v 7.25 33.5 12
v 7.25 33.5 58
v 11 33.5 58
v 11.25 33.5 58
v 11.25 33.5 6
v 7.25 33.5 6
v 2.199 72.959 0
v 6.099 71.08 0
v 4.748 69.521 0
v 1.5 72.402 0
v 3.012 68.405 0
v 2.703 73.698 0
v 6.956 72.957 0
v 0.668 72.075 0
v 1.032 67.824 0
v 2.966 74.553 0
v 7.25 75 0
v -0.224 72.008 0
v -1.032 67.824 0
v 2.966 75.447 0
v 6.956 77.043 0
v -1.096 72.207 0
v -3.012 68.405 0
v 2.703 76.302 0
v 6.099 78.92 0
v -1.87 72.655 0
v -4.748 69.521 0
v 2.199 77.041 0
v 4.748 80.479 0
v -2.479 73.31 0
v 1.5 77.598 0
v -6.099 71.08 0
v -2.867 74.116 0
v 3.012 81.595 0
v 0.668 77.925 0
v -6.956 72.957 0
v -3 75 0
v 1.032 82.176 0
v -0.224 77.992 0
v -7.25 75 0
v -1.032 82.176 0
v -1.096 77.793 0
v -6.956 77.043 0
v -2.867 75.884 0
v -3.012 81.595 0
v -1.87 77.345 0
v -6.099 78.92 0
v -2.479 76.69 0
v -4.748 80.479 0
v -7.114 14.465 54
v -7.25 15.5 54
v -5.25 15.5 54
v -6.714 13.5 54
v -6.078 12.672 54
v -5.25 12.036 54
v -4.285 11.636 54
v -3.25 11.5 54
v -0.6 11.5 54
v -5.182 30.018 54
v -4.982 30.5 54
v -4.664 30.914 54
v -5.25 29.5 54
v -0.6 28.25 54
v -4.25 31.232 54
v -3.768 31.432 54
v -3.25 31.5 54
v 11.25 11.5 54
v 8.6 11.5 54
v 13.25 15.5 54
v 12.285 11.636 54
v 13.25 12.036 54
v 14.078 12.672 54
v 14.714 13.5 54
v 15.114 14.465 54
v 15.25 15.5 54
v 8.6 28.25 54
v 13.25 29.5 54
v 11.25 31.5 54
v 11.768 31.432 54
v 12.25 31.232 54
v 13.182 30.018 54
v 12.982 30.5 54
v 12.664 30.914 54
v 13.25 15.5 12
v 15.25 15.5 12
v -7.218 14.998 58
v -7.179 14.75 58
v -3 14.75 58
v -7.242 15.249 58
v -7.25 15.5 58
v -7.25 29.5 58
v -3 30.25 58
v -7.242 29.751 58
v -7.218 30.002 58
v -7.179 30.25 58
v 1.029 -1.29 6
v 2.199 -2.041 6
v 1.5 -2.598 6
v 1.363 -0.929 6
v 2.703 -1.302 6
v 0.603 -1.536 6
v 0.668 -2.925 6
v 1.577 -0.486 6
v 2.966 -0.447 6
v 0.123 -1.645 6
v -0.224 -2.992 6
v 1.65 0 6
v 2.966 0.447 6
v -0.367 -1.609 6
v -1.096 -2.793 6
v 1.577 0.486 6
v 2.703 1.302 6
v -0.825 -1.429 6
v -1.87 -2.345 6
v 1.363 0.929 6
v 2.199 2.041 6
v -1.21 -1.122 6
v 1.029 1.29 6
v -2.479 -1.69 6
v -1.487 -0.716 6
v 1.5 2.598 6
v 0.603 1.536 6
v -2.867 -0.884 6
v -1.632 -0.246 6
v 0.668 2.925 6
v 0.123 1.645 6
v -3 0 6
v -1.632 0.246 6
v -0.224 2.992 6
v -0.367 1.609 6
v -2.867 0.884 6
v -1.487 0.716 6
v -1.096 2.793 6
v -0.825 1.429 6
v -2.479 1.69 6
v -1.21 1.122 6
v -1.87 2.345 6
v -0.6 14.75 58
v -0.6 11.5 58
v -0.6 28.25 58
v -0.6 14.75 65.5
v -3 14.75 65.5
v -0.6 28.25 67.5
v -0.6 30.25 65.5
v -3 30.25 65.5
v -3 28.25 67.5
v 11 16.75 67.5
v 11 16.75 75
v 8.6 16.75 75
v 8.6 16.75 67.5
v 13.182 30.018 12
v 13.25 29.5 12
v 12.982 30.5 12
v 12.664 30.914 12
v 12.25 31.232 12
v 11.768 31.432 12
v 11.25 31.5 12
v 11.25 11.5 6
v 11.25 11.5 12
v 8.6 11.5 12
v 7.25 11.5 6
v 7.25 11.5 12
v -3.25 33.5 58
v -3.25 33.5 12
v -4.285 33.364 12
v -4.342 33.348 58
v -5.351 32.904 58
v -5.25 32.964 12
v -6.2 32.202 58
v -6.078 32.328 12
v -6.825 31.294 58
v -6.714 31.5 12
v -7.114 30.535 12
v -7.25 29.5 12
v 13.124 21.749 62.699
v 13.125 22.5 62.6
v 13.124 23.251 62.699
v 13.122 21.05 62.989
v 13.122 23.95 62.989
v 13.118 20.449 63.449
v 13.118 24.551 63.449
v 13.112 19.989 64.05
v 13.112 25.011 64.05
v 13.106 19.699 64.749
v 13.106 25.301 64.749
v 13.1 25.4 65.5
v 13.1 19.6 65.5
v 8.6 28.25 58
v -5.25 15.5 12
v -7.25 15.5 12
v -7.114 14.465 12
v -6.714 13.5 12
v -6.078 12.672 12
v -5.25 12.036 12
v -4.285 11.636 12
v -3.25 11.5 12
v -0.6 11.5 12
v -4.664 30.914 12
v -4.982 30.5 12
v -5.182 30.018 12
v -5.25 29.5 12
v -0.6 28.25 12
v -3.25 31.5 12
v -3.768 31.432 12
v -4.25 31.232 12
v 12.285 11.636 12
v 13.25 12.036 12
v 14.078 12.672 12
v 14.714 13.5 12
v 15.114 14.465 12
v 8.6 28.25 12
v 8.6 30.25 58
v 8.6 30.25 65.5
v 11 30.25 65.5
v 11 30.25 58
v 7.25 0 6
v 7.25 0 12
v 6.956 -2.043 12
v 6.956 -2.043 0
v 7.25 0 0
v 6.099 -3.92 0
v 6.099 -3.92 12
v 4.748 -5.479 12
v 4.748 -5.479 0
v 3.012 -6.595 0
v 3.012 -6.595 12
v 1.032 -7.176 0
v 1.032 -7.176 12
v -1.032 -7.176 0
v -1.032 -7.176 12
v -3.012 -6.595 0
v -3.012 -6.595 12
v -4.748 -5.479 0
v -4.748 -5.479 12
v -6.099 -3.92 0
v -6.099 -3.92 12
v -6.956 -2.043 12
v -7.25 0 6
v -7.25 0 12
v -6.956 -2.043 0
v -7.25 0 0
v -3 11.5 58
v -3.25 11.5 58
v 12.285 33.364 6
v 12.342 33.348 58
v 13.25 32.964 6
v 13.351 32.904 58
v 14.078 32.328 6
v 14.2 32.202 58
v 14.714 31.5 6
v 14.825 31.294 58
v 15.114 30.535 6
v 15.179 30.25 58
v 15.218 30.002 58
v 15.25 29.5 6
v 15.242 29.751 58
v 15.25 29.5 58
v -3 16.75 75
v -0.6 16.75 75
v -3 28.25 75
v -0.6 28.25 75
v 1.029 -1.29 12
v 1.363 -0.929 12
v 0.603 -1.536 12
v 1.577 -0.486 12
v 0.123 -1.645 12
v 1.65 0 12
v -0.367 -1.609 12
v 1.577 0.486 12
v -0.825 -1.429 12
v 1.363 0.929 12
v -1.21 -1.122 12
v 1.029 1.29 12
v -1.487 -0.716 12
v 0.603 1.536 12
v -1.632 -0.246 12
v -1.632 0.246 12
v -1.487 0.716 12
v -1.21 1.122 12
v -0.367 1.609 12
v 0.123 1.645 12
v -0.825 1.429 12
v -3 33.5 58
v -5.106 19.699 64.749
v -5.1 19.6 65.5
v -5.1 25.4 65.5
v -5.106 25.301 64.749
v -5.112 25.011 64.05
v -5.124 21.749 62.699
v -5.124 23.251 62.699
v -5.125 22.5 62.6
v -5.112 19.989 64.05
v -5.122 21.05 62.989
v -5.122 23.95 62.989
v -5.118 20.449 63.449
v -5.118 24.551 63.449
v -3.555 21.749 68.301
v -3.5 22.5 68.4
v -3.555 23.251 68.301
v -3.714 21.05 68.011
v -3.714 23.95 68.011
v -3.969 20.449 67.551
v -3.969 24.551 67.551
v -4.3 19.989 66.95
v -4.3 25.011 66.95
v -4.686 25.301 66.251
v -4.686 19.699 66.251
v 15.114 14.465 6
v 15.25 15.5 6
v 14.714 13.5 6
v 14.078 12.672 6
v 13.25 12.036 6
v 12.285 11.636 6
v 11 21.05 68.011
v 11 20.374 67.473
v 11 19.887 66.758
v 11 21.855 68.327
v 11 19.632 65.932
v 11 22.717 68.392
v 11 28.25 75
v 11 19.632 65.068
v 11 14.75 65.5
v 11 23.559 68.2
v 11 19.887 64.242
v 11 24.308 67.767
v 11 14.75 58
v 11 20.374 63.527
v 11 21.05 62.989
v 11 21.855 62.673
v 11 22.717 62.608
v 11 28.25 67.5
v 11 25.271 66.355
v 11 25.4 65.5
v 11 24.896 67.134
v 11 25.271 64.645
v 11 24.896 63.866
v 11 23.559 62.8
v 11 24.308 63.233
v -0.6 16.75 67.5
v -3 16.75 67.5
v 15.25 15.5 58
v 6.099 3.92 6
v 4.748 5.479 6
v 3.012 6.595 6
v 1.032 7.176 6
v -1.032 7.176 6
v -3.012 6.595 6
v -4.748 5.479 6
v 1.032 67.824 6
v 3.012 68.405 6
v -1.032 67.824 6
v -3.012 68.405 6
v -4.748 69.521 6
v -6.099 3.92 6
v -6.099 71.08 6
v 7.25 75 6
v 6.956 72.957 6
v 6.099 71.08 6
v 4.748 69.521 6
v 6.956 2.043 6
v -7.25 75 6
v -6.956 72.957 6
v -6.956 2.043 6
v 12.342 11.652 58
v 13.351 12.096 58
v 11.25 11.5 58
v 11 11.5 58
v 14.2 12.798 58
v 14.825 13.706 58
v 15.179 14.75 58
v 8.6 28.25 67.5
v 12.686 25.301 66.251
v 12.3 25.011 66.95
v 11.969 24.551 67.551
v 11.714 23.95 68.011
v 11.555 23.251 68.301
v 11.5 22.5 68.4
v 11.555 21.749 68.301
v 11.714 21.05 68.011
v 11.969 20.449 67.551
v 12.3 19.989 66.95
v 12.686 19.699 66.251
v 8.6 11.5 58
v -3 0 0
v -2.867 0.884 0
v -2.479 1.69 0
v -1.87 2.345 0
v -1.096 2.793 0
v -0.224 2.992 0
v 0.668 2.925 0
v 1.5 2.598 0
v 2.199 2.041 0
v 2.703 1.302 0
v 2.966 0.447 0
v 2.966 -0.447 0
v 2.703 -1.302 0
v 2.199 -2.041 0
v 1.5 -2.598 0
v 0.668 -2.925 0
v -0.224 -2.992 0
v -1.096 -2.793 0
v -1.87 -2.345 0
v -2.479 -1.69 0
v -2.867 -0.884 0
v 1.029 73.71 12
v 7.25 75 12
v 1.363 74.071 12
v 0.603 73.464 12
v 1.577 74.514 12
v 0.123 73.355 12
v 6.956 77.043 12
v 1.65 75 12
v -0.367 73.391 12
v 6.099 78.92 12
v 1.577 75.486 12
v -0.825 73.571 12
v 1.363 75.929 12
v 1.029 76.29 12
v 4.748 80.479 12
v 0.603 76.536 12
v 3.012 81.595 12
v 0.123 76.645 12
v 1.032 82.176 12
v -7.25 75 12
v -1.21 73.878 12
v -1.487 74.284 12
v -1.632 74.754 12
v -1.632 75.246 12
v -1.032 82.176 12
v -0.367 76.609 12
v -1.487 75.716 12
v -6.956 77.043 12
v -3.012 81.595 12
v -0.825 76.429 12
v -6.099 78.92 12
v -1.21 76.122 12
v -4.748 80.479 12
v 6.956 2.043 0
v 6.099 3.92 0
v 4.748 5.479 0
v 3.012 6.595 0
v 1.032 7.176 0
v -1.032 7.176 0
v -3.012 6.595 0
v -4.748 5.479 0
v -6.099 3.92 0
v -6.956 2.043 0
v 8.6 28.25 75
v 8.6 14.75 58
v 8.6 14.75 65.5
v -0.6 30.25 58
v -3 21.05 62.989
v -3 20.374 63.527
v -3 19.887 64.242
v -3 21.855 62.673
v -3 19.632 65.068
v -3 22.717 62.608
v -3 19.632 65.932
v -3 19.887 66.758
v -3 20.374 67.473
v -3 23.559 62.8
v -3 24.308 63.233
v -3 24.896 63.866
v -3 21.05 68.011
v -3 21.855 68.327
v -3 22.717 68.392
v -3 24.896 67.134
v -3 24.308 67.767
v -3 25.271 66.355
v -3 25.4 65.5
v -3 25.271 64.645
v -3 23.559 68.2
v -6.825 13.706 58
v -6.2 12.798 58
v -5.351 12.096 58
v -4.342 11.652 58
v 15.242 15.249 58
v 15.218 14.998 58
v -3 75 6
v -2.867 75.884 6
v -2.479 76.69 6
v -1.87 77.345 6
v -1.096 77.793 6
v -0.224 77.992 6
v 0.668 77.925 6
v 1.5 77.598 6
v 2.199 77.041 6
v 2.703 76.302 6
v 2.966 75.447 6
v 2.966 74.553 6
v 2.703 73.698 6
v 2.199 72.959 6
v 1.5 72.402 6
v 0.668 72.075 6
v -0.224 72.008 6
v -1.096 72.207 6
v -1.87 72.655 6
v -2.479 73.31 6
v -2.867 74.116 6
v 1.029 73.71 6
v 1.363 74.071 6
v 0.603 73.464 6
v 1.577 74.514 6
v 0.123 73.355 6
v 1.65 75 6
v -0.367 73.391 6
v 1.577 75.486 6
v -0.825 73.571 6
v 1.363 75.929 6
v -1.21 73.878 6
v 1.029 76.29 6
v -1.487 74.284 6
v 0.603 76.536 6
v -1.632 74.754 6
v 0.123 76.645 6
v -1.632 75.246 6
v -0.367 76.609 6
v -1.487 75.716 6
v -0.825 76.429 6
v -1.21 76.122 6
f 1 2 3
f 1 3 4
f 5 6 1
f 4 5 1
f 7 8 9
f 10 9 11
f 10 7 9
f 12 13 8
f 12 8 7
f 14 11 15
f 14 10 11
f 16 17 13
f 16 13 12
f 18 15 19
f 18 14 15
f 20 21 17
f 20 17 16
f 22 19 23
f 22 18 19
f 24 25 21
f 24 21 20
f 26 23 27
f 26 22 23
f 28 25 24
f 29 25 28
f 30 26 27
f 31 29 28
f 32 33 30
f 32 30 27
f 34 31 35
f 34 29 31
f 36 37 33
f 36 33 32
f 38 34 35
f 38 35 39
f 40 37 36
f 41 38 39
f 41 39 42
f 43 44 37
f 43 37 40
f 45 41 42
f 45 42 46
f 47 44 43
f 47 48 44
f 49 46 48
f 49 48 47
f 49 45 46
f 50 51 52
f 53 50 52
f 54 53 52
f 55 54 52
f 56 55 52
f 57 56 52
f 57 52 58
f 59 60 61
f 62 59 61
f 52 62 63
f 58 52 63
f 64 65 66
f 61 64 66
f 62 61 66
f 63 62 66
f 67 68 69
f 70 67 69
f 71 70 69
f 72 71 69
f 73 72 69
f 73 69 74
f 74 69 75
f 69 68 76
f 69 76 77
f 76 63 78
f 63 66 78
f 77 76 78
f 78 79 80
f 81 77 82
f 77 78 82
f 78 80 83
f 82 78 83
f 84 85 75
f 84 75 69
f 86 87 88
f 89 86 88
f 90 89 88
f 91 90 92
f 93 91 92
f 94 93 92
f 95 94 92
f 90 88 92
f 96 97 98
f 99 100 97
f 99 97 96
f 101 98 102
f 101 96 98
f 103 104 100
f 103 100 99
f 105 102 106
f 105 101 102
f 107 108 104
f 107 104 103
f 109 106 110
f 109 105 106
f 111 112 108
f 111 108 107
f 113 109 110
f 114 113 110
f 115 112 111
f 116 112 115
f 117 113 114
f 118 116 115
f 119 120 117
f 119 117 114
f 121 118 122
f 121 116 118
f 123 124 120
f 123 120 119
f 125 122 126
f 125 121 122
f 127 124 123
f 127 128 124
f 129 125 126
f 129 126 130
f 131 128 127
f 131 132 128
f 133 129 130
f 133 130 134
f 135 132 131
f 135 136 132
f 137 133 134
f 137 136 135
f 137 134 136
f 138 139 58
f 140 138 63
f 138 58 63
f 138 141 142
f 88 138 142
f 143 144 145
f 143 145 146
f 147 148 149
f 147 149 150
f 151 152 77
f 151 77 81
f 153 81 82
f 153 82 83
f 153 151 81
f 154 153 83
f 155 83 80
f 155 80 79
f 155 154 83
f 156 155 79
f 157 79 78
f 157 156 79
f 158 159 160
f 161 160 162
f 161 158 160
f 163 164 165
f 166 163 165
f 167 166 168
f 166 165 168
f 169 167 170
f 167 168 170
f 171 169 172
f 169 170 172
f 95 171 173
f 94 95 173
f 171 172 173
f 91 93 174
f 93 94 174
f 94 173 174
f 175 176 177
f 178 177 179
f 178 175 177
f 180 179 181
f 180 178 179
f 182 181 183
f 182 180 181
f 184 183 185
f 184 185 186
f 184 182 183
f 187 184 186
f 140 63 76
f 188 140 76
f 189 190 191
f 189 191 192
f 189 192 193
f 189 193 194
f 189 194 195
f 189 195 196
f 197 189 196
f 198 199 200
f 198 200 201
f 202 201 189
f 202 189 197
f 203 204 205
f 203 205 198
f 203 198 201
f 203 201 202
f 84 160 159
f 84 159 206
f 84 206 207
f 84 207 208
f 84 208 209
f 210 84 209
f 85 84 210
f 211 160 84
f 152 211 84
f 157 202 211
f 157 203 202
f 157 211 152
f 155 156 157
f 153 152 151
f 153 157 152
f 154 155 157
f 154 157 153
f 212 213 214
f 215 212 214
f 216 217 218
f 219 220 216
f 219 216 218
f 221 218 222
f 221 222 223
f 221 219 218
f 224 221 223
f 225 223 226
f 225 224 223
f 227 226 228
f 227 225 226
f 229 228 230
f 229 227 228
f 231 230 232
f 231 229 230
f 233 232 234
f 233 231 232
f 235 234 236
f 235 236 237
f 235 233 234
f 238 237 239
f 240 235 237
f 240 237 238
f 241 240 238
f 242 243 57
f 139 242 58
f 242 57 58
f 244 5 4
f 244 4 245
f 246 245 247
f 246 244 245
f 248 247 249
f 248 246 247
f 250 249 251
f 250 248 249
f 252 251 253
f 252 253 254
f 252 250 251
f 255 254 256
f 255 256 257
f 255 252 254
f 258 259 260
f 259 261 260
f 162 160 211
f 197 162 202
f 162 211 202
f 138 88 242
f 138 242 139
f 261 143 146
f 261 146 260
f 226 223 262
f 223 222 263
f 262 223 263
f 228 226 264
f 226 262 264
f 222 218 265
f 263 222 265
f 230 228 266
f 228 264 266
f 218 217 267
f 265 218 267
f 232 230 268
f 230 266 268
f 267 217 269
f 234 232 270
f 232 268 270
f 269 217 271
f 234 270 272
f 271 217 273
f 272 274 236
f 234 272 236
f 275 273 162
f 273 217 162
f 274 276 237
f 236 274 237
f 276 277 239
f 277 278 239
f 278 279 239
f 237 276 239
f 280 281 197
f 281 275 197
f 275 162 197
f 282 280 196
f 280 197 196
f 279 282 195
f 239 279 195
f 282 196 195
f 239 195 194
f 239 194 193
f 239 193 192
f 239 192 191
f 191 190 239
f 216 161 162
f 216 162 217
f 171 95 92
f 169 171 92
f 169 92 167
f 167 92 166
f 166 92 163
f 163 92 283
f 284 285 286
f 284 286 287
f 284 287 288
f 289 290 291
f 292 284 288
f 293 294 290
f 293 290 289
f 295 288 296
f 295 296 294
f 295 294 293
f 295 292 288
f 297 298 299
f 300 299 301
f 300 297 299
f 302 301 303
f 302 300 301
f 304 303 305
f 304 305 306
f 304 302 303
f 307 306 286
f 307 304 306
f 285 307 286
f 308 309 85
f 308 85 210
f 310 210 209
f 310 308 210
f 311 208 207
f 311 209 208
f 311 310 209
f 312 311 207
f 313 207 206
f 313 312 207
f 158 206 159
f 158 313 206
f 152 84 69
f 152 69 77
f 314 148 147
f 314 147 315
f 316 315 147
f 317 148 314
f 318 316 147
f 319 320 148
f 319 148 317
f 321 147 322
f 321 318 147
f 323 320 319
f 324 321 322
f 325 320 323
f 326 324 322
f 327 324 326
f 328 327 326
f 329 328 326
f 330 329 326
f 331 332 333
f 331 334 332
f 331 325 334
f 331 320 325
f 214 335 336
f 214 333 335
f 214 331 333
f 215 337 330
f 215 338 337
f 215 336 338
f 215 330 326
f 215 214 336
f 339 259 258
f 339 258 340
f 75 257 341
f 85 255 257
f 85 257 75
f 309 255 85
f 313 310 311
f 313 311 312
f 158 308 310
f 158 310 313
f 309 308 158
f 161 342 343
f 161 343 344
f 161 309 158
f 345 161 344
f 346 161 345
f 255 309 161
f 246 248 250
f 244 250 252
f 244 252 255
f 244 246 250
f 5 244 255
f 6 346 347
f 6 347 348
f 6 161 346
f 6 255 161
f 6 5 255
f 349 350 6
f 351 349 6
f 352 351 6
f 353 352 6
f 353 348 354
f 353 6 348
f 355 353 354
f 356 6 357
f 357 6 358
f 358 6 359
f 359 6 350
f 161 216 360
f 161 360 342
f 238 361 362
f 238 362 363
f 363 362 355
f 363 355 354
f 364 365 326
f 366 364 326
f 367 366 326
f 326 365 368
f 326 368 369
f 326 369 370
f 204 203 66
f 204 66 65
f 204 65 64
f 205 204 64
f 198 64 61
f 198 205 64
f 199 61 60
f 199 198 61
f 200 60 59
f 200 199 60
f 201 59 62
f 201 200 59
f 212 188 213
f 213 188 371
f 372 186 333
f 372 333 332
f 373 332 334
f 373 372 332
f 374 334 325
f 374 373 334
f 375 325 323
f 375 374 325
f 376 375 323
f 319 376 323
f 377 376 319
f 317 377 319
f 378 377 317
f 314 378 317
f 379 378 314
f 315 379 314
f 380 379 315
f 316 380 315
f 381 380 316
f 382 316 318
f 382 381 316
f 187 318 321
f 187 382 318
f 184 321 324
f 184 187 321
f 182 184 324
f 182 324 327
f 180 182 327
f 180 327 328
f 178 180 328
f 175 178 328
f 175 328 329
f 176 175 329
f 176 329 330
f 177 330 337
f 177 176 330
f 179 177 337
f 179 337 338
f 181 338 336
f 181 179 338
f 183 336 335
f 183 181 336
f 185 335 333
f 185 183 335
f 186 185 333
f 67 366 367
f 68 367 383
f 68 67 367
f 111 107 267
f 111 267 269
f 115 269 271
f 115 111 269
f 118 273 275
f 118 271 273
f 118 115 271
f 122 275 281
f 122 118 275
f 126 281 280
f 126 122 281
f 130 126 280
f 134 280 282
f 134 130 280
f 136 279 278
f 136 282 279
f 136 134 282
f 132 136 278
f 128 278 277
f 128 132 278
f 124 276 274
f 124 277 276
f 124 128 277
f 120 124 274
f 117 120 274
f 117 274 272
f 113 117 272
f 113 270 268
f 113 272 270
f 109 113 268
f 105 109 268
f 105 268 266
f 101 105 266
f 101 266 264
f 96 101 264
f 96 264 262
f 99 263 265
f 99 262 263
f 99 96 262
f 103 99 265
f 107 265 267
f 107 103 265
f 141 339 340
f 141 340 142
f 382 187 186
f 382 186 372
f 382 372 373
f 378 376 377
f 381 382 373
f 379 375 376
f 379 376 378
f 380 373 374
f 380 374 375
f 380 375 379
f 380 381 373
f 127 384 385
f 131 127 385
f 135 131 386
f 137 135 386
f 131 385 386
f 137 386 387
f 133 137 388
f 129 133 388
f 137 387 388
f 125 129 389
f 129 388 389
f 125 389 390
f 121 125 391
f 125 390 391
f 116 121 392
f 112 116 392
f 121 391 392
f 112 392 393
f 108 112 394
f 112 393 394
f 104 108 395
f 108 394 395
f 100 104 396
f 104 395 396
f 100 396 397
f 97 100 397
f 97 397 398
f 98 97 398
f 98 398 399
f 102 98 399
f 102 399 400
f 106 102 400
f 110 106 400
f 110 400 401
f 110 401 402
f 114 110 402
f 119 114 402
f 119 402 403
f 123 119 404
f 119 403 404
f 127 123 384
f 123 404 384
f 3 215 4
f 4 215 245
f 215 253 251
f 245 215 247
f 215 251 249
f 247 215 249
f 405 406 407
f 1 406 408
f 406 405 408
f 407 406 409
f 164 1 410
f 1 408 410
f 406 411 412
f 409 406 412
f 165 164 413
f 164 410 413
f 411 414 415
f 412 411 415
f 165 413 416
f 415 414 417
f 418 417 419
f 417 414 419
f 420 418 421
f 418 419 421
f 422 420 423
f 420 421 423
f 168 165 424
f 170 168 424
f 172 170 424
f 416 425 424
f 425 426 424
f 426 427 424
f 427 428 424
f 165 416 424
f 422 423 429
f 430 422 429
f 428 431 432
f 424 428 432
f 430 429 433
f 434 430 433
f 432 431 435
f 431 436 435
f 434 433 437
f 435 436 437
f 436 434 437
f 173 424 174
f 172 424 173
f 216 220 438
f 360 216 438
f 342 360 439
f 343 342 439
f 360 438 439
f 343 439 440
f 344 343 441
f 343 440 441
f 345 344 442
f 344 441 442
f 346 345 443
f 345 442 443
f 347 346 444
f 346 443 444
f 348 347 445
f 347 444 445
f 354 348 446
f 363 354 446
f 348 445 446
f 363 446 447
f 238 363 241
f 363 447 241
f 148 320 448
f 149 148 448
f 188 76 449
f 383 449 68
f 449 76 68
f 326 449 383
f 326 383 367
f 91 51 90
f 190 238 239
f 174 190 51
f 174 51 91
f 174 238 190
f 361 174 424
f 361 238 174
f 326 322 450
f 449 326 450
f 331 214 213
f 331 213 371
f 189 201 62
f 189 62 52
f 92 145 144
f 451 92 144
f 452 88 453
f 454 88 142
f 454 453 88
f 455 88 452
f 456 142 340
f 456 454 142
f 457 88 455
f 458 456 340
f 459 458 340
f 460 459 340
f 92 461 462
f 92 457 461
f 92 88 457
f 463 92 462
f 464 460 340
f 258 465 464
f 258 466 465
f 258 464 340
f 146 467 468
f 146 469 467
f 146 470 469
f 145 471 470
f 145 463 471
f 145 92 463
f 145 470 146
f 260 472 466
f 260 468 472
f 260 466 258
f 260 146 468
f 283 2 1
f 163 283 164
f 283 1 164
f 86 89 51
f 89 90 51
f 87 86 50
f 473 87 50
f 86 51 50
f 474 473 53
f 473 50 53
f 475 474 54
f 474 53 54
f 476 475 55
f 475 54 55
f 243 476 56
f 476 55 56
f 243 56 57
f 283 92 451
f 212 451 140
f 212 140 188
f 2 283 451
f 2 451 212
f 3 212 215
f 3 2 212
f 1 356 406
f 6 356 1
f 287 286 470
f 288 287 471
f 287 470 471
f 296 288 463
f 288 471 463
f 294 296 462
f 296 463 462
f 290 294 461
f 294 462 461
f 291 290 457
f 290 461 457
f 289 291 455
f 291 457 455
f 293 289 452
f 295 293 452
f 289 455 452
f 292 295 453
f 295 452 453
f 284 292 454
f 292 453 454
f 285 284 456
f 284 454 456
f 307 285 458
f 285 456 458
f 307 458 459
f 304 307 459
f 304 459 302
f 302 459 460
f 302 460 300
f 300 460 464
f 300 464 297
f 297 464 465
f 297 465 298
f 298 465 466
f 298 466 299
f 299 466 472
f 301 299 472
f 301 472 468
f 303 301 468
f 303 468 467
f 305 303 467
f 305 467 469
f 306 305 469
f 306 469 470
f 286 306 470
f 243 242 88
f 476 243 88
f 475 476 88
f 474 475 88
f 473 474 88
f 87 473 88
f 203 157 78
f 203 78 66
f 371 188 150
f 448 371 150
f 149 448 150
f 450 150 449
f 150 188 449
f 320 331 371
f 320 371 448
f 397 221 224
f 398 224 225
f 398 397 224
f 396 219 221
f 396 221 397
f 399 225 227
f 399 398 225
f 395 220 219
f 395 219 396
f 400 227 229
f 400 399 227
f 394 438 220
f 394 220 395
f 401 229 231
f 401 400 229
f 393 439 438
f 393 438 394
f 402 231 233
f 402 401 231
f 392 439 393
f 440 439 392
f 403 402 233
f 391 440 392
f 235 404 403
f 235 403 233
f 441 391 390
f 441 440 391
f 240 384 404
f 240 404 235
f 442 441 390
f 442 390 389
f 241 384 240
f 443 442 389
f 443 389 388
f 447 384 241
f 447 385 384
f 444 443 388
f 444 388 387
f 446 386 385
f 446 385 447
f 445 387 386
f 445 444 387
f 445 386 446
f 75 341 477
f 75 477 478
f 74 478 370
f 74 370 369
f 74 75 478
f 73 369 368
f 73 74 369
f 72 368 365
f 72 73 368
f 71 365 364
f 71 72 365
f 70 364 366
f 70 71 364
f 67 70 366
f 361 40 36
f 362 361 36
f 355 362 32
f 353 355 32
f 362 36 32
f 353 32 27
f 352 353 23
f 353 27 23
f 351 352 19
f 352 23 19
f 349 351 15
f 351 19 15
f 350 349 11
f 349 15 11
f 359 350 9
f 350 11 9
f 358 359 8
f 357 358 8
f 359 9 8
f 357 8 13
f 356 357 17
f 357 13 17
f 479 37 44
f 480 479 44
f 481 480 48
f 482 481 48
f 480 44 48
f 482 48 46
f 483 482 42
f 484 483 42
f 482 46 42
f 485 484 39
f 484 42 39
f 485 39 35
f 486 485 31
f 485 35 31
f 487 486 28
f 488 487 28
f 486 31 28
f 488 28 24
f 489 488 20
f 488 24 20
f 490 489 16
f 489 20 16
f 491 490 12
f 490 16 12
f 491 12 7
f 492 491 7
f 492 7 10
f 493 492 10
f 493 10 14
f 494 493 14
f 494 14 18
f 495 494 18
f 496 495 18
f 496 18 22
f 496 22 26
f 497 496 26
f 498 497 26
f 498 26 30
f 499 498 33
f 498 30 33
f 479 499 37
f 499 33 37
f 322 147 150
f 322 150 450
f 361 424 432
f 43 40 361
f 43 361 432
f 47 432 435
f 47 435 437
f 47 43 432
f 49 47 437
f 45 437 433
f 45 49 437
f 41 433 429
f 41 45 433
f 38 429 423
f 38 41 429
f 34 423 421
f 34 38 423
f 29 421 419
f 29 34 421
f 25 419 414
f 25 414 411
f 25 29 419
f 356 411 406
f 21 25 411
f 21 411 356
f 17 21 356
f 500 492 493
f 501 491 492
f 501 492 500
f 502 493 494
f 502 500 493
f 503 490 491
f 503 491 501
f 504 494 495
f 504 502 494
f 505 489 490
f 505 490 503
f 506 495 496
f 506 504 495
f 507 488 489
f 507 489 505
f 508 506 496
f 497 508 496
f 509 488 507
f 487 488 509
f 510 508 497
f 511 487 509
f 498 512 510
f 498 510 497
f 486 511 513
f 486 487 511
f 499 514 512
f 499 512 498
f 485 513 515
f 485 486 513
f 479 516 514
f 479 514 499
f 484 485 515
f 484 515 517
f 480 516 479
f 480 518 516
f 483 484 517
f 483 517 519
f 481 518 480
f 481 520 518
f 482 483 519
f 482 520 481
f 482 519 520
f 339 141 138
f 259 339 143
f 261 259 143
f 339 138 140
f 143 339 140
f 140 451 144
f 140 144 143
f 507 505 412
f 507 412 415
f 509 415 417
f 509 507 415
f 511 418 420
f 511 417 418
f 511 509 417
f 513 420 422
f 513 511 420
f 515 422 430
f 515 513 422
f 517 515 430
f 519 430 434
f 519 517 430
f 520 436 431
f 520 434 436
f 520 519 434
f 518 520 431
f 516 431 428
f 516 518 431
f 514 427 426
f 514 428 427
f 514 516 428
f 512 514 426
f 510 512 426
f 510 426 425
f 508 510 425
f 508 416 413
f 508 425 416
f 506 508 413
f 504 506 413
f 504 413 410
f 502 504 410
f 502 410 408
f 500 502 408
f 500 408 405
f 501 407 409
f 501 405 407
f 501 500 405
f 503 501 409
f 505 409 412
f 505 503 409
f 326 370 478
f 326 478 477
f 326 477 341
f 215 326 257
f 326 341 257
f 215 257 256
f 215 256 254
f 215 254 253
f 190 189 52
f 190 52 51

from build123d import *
from build123d.topology import SkipClean

# Parameters (mm, degrees)
SKETCH1_R           = 1.65
BOSS_EXTRUDE1_DEPTH = 75
SKETCH7_R           = 3
CUT_EXTRUDE6_DEPTH  = 6
CUT_EXTRUDE12_START = -63
CUT_EXTRUDE12_DEPTH = 63
SKETCH9_W           = 17
SKETCH9_H           = 22
SKETCH9_R           = 2.9
CUT_EXTRUDE8_DEPTH  = 4.25
CUT_EXTRUDE9_START  = -4.25
SKETCH10_W          = 17
SKETCH10_H          = 22
SKETCH10_R          = 2.9
CUT_EXTRUDE9_DEPTH  = 4.25
CUT_EXTRUDE10_DEPTH = 17
CUT_EXTRUDE11_START = -18.25
CUT_EXTRUDE11_DEPTH = 14
CUT_EXTRUDE13_START = -13.9000001
CUT_EXTRUDE13_DEPTH = 6.9000001
CUT_EXTRUDE14_DEPTH = 42


with BuildPart() as part:
    # Sketch1 → Boss-Extrude1 (new body)
    with BuildSketch(Plane.XY):
        with BuildLine():
            Line((15.25, 29.5), (15.25, 15.5))
            ThreePointArc((15.25, 15.5), (14.078427125, 12.671572875), (11.25, 11.5))
            Line((11.25, 11.5), (7.25, 11.5))
            Line((7.25, 11.5), (7.25, 0))
            ThreePointArc((7.25, 0), (0, -7.25), (-7.25, 0))
            Line((-7.25, 0), (-7.25, 75))
            ThreePointArc((-7.25, 75), (0, 82.25), (7.25, 75))
            Line((7.25, 75), (7.25, 33.5))
            Line((7.25, 33.5), (11.25, 33.5))
            ThreePointArc((11.25, 33.5), (14.078427125, 32.328427125), (15.25, 29.5))
        make_face()
        Circle(SKETCH1_R, mode=Mode.SUBTRACT)
        with Locations((0, 75)):
            Circle(SKETCH1_R, mode=Mode.SUBTRACT)
    extrude(amount=BOSS_EXTRUDE1_DEPTH)

    # Sketch7 → Cut-Extrude6 (cut)
    with SkipClean():  # the faces are left unmerged after this step: merging them gives an invalid solid
        with BuildSketch(Plane(origin=(0, 0, 0), x_dir=(-1, 0, 0), z_dir=(0, 0, -1))):
            with Locations((0, 75)):
                Circle(SKETCH7_R)
            Circle(SKETCH7_R)
            with BuildLine():
                Line((-7.25, 75), (-7.25, 33.5))
                Line((-7.25, 33.5), (-11.25, 33.5))
                ThreePointArc((-11.25, 33.5), (-14.078427125, 32.328427125), (-15.25, 29.5))
                Line((-15.25, 29.5), (-15.25, 15.5))
                ThreePointArc((-15.25, 15.5), (-14.078427125, 12.671572875), (-11.25, 11.5))
                Line((-11.25, 11.5), (-7.25, 11.5))
                Line((-7.25, 11.5), (-7.25, 0))
                ThreePointArc((-7.25, 0), (0, 7.25), (7.25, 0))
                Line((7.25, 0), (7.25, 75))
                ThreePointArc((7.25, 75), (0, 67.75), (-7.25, 75))
            make_face()
        extrude(amount=-CUT_EXTRUDE6_DEPTH, mode=Mode.SUBTRACT)

    # Sketch14 → Cut-Extrude12 (cut)
    with SkipClean():  # the faces are left unmerged after this step: merging them gives an invalid solid
        with BuildSketch(Plane.XY.offset(75).offset(CUT_EXTRUDE12_START)):
            with BuildLine():
                Line((-0.6, 28.25), (8.6, 28.25))
                Line((8.6, 28.25), (8.6, 11.5))
                Line((8.6, 11.5), (7.25, 11.5))
                Line((7.25, 11.5), (7.25, 0))
                ThreePointArc((7.25, 0), (0, -7.25), (-7.25, 0))
                Line((-7.25, 0), (-7.25, 15.5))
                ThreePointArc((-7.25, 15.5), (-6.078427125, 12.671572875), (-3.25, 11.5))
                Line((-3.25, 11.5), (-0.6, 11.5))
                Line((-0.6, 11.5), (-0.6, 28.25))
            make_face()
            with BuildLine():
                Line((7.25, 33.5), (-3.25, 33.5))
                ThreePointArc((-3.25, 33.5), (-6.078427125, 32.328427125), (-7.25, 29.5))
                Line((-7.25, 29.5), (-7.25, 75))
                ThreePointArc((-7.25, 75), (0, 82.25), (7.25, 75))
                Line((7.25, 75), (7.25, 33.5))
            make_face()
        extrude(amount=CUT_EXTRUDE12_DEPTH, mode=Mode.SUBTRACT)

    # Sketch9 → Cut-Extrude8 (cut)
    with SkipClean():  # the faces are left unmerged after this step: merging them gives an invalid solid
        with BuildSketch(Plane(origin=(15.25, 0, 0), x_dir=(0, 0, -1), z_dir=(1, 0, 0))):
            with Locations((-66.5, 22.5)):
                Rectangle(SKETCH9_W, SKETCH9_H)
            with Locations(Location((-65.5, 22.5, 0), (0, 0, 90))):
                Circle(SKETCH9_R, mode=Mode.SUBTRACT)
        extrude(amount=-CUT_EXTRUDE8_DEPTH, mode=Mode.SUBTRACT)

    # Sketch10 → Cut-Extrude9 (cut)
    with SkipClean():  # the faces are left unmerged after this step: merging them gives an invalid solid
        with BuildSketch(Plane.ZY.offset(7.25).offset(CUT_EXTRUDE9_START)):
            with Locations((66.5, 22.5)):
                Rectangle(SKETCH10_W, SKETCH10_H)
            with Locations(Location((65.5, 22.5, 0), (0, 0, 90))):
                Circle(SKETCH10_R, mode=Mode.SUBTRACT)
        extrude(amount=CUT_EXTRUDE9_DEPTH, mode=Mode.SUBTRACT)

    # Sketch11 → Cut-Extrude10 (cut)
    with SkipClean():  # the faces are left unmerged after this step: merging them gives an invalid solid
        with BuildSketch(Plane.XY.offset(75)):
            Polygon((-7.25, 14.75), (-7.25, 11.5), (15.25, 11.5), (15.25, 14.75), (8.6, 14.75), (8.6, 30.25), (15.25, 30.25), (15.25, 33.5), (-7.25, 33.5), (-7.25, 30.25), (-0.6, 30.25), (-0.6, 14.75), align=None)
        extrude(amount=-CUT_EXTRUDE10_DEPTH, mode=Mode.SUBTRACT)

    # Cut-Extrude11: read off the stored shape, not the designer's step
    # Cut-Extrude11 outline → Cut-Extrude11 (cut)
    with SkipClean():  # the faces are left unmerged after this step: merging them gives an invalid solid
        with BuildSketch(Plane.ZY.offset(7.25).offset(CUT_EXTRUDE11_START)):
            Polygon((75, 16.75), (67.5, 16.75), (65.5, 14.75), (75, 14.75), align=None)
            Polygon((67.5, 28.25), (75, 28.25), (75, 30.25), (65.5, 30.25), align=None)
        extrude(amount=CUT_EXTRUDE11_DEPTH, mode=Mode.SUBTRACT)

    # Cut-Extrude13: read off the stored shape, not the designer's step
    # Cut-Extrude13 outline → Cut-Extrude13 (cut)
    with SkipClean():  # the faces are left unmerged after this step: merging them gives an invalid solid
        with BuildSketch(Plane(origin=(0, 33.5, 0), x_dir=(1, 0, 0), z_dir=(0, 1, 0)).offset(CUT_EXTRUDE13_START)):
            Polygon((-3.5, -68.4), (-5.1, -65.5), (-5.125, -62.6), (-7.25, -62.6), (-7.25, -68.4), align=None)
            Polygon((13.125, -62.6), (13.1, -65.5), (11.5, -68.4), (15.25, -68.4), (15.25, -62.6), align=None)
        extrude(amount=CUT_EXTRUDE13_DEPTH, mode=Mode.SUBTRACT)

    # Sketch15 → Cut-Extrude14 (cut)
    with SkipClean():  # the faces are left unmerged after this step: merging them gives an invalid solid
        with BuildSketch(Plane.XY.offset(12)):
            with BuildLine():
                Line((-3.25, 11.5), (11.25, 11.5))
                ThreePointArc((11.25, 11.5), (14.078427125, 12.671572875), (15.25, 15.5))
                Line((15.25, 15.5), (13.25, 15.5))
                Line((13.25, 15.5), (13.25, 29.5))
                ThreePointArc((13.25, 29.5), (12.664213562, 30.914213562), (11.25, 31.5))
                Line((11.25, 31.5), (-3.25, 31.5))
                ThreePointArc((-3.25, 31.5), (-4.664213562, 30.914213562), (-5.25, 29.5))
                Line((-5.25, 29.5), (-5.25, 15.5))
                Line((-5.25, 15.5), (-7.25, 15.5))
                ThreePointArc((-7.25, 15.5), (-6.078427125, 12.671572875), (-3.25, 11.5))
            make_face()
        extrude(amount=CUT_EXTRUDE14_DEPTH, mode=Mode.SUBTRACT)


solid = part.part
